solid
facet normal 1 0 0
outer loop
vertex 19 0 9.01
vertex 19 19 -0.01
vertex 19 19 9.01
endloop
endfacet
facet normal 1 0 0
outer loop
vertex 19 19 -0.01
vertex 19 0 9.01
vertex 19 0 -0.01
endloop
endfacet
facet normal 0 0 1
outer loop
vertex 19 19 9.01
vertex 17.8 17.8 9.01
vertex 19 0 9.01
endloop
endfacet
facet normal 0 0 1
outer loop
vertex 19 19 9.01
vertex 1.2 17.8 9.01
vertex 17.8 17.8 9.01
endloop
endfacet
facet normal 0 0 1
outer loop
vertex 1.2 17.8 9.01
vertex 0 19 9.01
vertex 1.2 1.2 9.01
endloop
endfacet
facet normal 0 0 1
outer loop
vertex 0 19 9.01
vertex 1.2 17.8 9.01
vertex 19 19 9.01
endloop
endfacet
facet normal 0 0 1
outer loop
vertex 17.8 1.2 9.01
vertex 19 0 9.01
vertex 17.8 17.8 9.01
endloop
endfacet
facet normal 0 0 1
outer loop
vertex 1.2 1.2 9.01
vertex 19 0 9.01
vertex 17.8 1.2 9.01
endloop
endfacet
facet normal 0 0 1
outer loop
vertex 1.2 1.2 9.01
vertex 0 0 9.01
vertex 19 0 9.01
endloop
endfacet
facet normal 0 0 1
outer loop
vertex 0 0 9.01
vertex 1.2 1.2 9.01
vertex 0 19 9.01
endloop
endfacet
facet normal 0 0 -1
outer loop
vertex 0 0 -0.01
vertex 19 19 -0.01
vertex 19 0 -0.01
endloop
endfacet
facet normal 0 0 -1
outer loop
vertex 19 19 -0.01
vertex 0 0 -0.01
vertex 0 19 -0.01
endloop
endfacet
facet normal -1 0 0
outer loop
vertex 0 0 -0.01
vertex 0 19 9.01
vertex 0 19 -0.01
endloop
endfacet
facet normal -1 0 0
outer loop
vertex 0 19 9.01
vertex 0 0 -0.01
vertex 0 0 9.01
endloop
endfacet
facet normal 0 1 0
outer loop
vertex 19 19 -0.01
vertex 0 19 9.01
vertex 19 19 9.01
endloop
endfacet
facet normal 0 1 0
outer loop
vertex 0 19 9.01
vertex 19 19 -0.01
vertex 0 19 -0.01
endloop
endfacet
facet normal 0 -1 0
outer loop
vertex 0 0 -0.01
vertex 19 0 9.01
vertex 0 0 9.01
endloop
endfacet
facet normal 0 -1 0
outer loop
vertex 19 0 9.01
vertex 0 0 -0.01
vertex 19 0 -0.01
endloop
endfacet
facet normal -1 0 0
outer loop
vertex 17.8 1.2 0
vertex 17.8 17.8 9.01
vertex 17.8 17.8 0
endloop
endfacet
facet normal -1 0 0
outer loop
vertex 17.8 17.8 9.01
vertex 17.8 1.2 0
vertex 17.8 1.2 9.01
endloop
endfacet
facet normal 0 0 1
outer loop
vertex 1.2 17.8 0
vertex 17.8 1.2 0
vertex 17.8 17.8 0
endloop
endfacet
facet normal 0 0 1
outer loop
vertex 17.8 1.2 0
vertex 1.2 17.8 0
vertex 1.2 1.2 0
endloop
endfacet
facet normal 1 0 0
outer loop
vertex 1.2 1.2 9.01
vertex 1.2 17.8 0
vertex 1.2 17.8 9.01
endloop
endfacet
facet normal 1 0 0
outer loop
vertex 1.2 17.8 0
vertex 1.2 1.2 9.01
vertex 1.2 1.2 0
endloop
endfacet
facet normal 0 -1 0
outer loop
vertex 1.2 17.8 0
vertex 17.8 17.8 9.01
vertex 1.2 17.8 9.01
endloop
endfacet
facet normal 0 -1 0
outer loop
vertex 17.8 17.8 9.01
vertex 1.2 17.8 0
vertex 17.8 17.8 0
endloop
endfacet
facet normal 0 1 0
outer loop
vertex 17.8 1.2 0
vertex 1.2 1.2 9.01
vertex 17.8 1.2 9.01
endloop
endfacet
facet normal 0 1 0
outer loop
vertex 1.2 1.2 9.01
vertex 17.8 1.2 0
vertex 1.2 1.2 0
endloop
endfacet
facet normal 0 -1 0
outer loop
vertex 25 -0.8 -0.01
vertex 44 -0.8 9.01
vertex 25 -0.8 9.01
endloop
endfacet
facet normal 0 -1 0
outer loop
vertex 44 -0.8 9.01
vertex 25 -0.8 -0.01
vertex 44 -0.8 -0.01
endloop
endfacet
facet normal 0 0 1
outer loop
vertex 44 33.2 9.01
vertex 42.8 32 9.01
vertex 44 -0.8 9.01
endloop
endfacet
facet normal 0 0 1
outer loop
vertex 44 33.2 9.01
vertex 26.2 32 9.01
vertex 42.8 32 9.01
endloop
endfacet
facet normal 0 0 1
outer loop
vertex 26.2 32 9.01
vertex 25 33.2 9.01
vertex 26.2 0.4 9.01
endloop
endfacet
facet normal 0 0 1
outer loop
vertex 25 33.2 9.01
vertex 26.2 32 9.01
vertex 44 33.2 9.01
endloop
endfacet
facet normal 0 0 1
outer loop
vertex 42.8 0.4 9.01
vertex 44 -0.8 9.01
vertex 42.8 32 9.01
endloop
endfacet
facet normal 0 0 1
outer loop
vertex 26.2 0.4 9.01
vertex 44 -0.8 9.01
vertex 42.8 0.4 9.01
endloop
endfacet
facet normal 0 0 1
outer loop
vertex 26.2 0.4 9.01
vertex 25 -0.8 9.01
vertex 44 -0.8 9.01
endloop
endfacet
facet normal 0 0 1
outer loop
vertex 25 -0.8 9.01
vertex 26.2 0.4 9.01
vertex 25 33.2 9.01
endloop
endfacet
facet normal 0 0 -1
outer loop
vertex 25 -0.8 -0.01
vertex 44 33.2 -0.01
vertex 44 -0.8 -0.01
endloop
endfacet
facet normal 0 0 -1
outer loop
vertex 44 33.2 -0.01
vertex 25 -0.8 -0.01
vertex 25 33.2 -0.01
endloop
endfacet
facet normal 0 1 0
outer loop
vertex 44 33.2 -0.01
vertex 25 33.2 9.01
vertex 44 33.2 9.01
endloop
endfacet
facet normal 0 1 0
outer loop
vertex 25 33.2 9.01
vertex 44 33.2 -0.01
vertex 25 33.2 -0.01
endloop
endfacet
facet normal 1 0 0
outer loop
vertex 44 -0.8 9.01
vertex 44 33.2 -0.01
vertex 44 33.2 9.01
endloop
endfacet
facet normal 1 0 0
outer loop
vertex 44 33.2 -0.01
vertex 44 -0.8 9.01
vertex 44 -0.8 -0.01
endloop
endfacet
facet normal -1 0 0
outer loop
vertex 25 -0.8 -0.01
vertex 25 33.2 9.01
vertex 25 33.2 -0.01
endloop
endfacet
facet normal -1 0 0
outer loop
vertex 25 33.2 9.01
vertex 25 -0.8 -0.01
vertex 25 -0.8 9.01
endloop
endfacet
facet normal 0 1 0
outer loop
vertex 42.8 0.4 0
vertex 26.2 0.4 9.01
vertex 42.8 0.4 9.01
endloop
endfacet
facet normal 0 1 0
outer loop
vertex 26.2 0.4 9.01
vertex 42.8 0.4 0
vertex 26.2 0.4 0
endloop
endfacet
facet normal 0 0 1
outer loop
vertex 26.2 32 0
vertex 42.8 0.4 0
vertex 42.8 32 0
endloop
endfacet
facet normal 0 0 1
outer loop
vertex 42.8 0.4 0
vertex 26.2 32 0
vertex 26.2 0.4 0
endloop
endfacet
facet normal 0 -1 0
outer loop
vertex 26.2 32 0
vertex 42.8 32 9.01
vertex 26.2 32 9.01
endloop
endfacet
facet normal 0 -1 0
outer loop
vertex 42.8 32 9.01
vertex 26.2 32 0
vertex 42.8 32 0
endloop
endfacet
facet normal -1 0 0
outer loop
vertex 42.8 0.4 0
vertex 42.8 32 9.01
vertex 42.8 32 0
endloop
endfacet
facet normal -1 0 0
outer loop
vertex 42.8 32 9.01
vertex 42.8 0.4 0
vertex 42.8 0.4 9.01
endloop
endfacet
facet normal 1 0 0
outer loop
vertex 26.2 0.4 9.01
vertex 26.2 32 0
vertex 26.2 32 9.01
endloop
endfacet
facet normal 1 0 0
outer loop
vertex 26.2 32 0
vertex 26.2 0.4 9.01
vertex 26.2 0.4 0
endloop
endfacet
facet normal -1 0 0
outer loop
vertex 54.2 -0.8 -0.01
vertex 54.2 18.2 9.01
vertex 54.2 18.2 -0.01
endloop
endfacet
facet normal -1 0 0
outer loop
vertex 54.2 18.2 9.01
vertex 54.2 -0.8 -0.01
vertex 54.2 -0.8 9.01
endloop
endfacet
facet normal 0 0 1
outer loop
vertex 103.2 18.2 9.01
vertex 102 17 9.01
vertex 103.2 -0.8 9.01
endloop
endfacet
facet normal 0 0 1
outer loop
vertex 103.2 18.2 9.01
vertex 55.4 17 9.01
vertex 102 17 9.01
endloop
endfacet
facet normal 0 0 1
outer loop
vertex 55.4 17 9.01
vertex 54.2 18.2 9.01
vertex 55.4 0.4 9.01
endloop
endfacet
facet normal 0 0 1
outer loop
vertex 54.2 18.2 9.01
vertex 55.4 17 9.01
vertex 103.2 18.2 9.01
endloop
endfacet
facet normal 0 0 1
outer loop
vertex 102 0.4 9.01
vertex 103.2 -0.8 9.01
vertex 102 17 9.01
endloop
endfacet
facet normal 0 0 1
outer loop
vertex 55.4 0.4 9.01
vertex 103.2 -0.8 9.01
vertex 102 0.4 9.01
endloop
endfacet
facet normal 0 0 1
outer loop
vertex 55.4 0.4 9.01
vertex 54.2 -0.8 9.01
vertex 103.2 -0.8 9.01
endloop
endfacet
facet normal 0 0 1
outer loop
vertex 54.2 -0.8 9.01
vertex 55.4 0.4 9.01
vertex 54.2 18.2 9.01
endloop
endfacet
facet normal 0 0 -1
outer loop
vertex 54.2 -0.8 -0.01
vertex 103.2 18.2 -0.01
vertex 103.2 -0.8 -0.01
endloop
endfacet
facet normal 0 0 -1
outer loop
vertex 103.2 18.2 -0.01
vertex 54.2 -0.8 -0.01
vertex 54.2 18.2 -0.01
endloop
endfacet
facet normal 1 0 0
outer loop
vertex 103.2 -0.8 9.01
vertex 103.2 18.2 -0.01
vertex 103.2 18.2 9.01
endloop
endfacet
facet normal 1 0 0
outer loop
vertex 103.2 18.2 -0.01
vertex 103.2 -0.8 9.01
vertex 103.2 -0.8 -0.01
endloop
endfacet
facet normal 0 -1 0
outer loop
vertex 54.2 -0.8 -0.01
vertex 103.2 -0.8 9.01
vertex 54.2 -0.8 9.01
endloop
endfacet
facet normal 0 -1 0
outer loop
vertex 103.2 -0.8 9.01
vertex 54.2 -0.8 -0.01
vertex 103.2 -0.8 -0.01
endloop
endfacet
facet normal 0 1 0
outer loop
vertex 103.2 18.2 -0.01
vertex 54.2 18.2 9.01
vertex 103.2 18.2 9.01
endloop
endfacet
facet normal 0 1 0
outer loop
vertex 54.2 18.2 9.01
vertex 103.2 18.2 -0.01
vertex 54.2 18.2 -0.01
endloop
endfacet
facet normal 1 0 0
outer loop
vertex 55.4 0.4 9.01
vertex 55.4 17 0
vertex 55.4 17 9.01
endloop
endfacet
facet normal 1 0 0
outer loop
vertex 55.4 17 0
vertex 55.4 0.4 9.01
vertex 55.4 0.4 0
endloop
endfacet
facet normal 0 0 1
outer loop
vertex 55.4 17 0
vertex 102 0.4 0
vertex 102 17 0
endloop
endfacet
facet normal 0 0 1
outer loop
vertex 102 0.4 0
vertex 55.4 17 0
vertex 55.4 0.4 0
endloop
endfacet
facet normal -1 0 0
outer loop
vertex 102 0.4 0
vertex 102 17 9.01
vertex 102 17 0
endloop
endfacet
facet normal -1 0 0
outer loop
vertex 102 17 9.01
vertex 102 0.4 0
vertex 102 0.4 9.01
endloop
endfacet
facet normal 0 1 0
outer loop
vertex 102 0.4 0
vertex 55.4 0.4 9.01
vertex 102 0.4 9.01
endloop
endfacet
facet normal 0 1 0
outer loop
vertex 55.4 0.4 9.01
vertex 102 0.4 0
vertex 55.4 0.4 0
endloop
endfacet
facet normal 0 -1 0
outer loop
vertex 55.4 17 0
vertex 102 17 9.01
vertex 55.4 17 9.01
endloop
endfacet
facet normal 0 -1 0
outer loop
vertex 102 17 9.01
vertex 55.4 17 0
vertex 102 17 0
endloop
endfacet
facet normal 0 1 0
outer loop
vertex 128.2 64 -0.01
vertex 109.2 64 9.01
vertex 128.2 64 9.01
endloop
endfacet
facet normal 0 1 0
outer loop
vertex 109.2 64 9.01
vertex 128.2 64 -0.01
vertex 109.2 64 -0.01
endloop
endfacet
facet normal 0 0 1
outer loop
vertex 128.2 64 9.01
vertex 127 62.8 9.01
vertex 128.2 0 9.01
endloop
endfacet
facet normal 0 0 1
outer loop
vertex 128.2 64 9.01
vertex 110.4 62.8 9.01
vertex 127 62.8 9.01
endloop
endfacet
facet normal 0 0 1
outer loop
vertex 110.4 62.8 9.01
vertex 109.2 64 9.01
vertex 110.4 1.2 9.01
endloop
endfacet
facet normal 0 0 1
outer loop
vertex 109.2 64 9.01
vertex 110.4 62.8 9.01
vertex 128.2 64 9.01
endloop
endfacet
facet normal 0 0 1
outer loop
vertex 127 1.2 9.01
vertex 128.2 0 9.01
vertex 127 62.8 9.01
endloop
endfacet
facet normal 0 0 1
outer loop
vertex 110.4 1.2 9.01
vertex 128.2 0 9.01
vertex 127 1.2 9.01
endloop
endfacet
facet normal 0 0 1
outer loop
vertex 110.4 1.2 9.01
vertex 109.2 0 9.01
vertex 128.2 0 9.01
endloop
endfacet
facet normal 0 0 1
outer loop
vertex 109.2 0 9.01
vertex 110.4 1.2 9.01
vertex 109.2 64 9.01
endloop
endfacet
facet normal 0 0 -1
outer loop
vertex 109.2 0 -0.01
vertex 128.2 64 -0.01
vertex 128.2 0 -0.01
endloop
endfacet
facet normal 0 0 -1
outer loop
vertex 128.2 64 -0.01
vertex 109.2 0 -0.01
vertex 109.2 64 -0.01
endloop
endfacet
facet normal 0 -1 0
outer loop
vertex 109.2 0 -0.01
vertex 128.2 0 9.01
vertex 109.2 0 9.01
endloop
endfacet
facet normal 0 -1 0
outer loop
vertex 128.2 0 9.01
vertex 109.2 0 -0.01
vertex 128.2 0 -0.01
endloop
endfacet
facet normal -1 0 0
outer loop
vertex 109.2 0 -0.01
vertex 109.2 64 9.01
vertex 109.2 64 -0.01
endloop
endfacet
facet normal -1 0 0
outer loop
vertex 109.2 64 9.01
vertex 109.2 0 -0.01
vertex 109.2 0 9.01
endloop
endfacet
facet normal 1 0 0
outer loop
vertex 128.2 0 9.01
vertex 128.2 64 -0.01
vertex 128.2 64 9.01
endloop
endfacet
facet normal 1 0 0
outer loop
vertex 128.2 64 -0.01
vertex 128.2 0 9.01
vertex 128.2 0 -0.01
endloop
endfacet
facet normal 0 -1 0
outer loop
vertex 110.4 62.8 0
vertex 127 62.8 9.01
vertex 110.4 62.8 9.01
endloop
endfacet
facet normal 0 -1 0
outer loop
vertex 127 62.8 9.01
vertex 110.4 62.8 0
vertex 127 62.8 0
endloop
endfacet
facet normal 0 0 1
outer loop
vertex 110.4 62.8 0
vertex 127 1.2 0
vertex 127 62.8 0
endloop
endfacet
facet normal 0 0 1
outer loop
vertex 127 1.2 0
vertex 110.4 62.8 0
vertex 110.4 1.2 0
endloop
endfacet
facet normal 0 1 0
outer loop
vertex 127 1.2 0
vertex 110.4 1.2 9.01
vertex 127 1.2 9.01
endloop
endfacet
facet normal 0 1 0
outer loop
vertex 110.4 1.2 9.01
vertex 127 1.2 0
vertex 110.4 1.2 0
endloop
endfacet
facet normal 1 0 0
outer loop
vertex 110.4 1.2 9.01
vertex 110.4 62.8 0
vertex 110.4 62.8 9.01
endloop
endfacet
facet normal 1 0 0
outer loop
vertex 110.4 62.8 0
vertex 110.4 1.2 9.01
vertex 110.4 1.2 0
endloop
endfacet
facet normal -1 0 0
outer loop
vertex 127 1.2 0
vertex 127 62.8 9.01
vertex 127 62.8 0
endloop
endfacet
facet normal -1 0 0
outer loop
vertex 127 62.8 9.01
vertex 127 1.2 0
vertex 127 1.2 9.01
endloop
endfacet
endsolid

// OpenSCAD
// file: ../../Base/Boxes.scad
// Fischertechnik Box Foundation
// Pre-designed Boxes

use <Constants.scad>

include <PlacementOptions.scad>

box190Width = 190;
box190Depth = 130;
box130Width = 130;
box130Depth = 95;
boxUsageHeight = 33.9;
boxWallThickness = 2.4;
boxBaseThickness = 1.0;

// getBoxWallThickness()
// Gets the wall thickness of a Fischertechnik Box

function getBoxWallThickness() = boxWallThickness;

// Gets the usable height of a fischertechnik box
function getBoxUsageHeight() = boxUsageHeight;

// Gets the thickness of the Fischertechnik box base.
function getBoxBaseThickness() = boxBaseThickness;

// Gets the usable inner space of a Box 190 as an x/y-list
function getBox190Space() = [
    box190Width - 2*getBoxWallThickness(), 
    box190Depth - 2*getBoxWallThickness() ];

// Imports the Fischertechnik empty box 130x190 mm and places it at position 0,0
// 190x130 are the outer sizes, the inner space is slightly smaller. Use getBox190Space() to get the inner sizes.
// This module needs the STL file "Fischertechnik Box 130x190.stl" in the library path.
// The box is positioned that the usable inner space is at the 0,0,0 position. The

module Box190() {
    translate([-getBoxWallThickness(),-getBoxWallThickness(),-getBoxBaseThickness()])
        import("Fischertechnik Box 130x190.stl", convexity=3);
}

// Gets the usable inner space of a Box 130 as an x/y-list
function getBox130Space() = [
    box130Width - 2*getBoxWallThickness(), 
    box130Depth - 2*getBoxWallThickness() ];

// Imports the Fischertechnik empty box 95x130 mm and places it at position 0,0
// 190x130 are the outer sizes, the inner space is slightly smaller. Use getBox190Space() to get the inner sizes.
// This module needs the STL file "Fischertechnik Box 95x130.stl" in the library path.
// The box is positioned that the usable inner space is at the 0,0,0 position. The

module Box130() {
    translate([-getBoxWallThickness(),-getBoxWallThickness(),-getBoxBaseThickness()])
        import("Fischertechnik Box 95x130.stl", convexity=3);
}

// Creates a web at the specified box walls
// corner 0 = LowerLeft, 1 = UpperLeft, 2 = UpperRight, 3 = LowerRight
// side 0 = LeftOfCorner, 1 = RightOfCorner
// distance = Distance in mm from the corner
// box = inner width and depth of the box (default: Box 190)
// webWidth = length of the web (default is 3 mms)
// webThickness = thickness of the web (default is 1 mm)

module BoxWeb(corner, side, distance, box=getBox190Space(), webWidth=3, webThickness=1.0) {
    sink = getBoxWallThickness()/2;

    width = (corner % 2 == 0) ? 
            (side == LeftOfCorner ? webWidth : webThickness) :
            (side == LeftOfCorner ? webThickness : webWidth);

    depth = (corner % 2 == 0) ? 
            (side == RightOfCorner ? webWidth : webThickness) :
            (side == RightOfCorner ? webThickness : webWidth);
    
    xDiff = corner == LowerLeft ? 
                (side == LeftOfCorner ? -sink : distance) :
            (corner == UpperLeft ?                
                (side == LeftOfCorner ? distance : -sink) :
            (corner == UpperRight ?
                (side == LeftOfCorner ? box.x-webWidth+sink : box.x-distance-webThickness) :
                (side == LeftOfCorner ? box.x-distance-webThickness: box.x-webWidth+sink)));

    yDiff = corner == LowerLeft ? 
                (side == RightOfCorner ? -sink : distance) :
            (corner == UpperLeft ?
                (side == RightOfCorner ? box.y-distance : box.y-webWidth+sink) :
            (corner == UpperRight ?
                (side == RightOfCorner ? box.y-webWidth+sink : box.y-distance) :
                (side == RightOfCorner ? distance : -sink)));
    
    translate([xDiff, yDiff, -getExcess()])
        cube([width, depth, boxUsageHeight + 2*getExcess()]);
}
// file: ../../Base/Rotation.scad
// Fischertechnik Box Foundation
// Geometry Helpers Rotation

include <PlacementOptions.scad>

// getRotatedSpace(space, rotation=NoRotation)
// Rotates the space dependent on the specified rotation

function getRotatedSpace(space, rotation=NoRotation) = [
    (rotation == Rotate90 || rotation == Rotate270) ? space.y : space.x,
    (rotation == Rotate90 || rotation == Rotate270) ? space.x : space.y
];

// Rotates the given space around the fixed left lower corner
// space = the space the children needs as width/depth list [width,depth]
// rotation = 0 Rotate0 degrees, 1 Rotate90 degrees, 2 Rotate180 degrees, 3 Rotate270 degrees (equivalent to -90)

module RotateFix(space, rotation=Rotate0) {
    dy = (rotation == Rotate0 || rotation == Rotate270) ? 0 :
        (rotation == Rotate90) ? space.x :
        space.y;
    dx = (rotation < Rotate180) ? 0 :
        (rotation == Rotate180) ? space.x :
        space.y;
    
    translate([dx, dy, 0])
        rotate([0, 0, rotations[rotation]])
            children();
}
// file: ../../Base/Alignment.scad
// Fischertechnik Box Foundation
// Geometry Helpers Alignment

include <PlacementOptions.scad>

// getAlignedX(elementWidth, spaceWidth, align=AlignRight, offset=0)
// Gets the aligned X offset of an element with the given
// width in the given space.
// elementWidth = The width of the element to positon
// spaceWidth = The space where the element should be aligned
// align = 0 AlignLeft, 1 AlignCenter, 2 AlignRight
// offset = an optional offset from the aligned position. When
// aligned left or centered, then positive values are in X direction.
// When aligned right then positive values are in negative X direction.

function getAlignedX(elementWidth, spaceWidth, align=AlignRight, offset=0) =
    (align == AlignLeft) ?
        offset :
        ((align == AlignCenter) ?
        (spaceWidth - elementWidth)/2 + offset :
        spaceWidth - offset - elementWidth);

// getAlignedY(elementDepth, spaceDepth, align=AlignTop, offset=0)
// Gets the aligned Y offset of an element with the given
// depth in the given space.
// elementDepth = The depth of the element to positon
// spaceDepth = The space where the element should be aligned
// align = 0 AlignBottom, 1 AlignCenter, 2 AlignTop
// offset = an optional offset from the aligned position. When
// aligned bottom or centered, then positive values are in Y direction.
// When aligned top then positive values are in negative Y direction.

function getAlignedY(elementDepth, spaceDepth, align=AlignTop, offset=0) =
    (align == AlignBottom) ?
        offset :
        ((align == AlignCenter) ?
        (spaceDepth - elementDepth)/2 + offset :
        spaceDepth - offset - elementDepth);
// file: ../../Base/Constants.scad
// Fischertechnik Box Foundation
// Constants

// Constant values necessary for multiple elements

// Base constants
dividerThickness = 1.2;
excess = 0.01;
fragments = 90;
tolerance = 0.8;

// Gets the thickness of a divider 
function getDividerThickness() = dividerThickness;

// Gets the excess that is used to merge walls into each other
function getExcess() = excess;

// Gets amount of fragments of a cylinder
function getFragments() = fragments;

// Gets the inner tolerance of a frame to each side
function getTolerance() = tolerance;


// Fischertechnik specific constants
axisDiameter = 4;
axisBottomDiameter = axisDiameter + 1;
standardEdgeDistance = 2.5;
standardWebDistance = 11.5;
standardCornerLength = 15;
tubeWallFactor = 1.6;

// Gets axis diameter
function getAxisDiameter() = axisDiameter;

// Gets axis bottom diameter for thicker part at the bottom
function getAxisBottomDiameter() = axisBottomDiameter;

// gets the standard distance to the wall of the box for dockable frames with webs
function getStandardEdgeDistance() = standardEdgeDistance;

// gets the standard distance of each web to the corner of the dockable frame
function getStandardWebDistance() = standardWebDistance;

// gets the standard length of the corner walls of a dockable frame
function getStandardCornerLength() = standardCornerLength;

// gets the wall thickness of a tube.
function getTubeWallThickness() = tubeWallFactor * getDividerThickness();
// file: ../../Base/PlacementOptions.scad
// Fischertechnik Box Foundation
// Placement Options

// Alignment
NoAlign = 0;
AlignLeft = 1;
AlignBottom = 2;
AlignCenter = 3;
AlignRight = 4;
AlignTop = 5;

// Element rotation degree steps
rotations = [0, -90, -180, -270];

// Rotation
NoRotation = 0;
Rotate0 = 0;
Rotate90 = 1;
Rotate180 = 2;
Rotate270 = 3;

// Docking (seen from above)
NoDock = -1;
DockLeft = 0;
DockTop = 1;
DockRight = 2;
DockCorner = 2;
DockBottom = 3;

// Web corners
LowerLeft = 0;
UpperLeft = 1;
UpperRight = 2;
LowerRight = 3;

// Web position relative to corner
LeftOfCorner = 0;
RightOfCorner = 1;
// file: ../../Elements/FrameAngleEquilateral.scad
// Fischertechnik Box Library
// Frame for equilateral angle blocks
// 31010

use <../Base/Constants.scad>
use <../ModelBase/Simple.scad>

width = 15;
depth = 15;
height = 9;

// getFrameAngleEquilateralSpace
// Gets the space the frame angle equilateral needs for count blocks as width and depth (.x and .y as a list)
// count = Count of equilateral angle blocks

function getFrameAngleEquilateralSpace(count=1) = getFrameOuterVolume([width * count, depth, height]);
/*[
    frameGridWidth * count + 2 * getWallThickness() + getTolerance(), 
    frameGridDepth + 2 * getWallThickness() + getFrameInnerGap()];*/

// FrameAngleEquilateral(count)
// count = Count of angle blocks in x direction
// The walls of the frame are 9 mm high.
// The complete frame has a tolerance of addition 1 mm in each direction.

module FrameAngleEquilateral(count=1) {
    innerVolume = getFrameInnerVolume([width * count, depth, height]);
    Frame(innerVolume);
}

// Tests
color ("lightgray")
FrameAngleEquilateral(2);
// file: ../../Base/Deployment.scad
// Fischertechnik Box Foundation
// Geometry Helpers Deployment

use <Constants.scad>
use <Placement.scad>
use <Rotation.scad>

include <PlacementOptions.scad>

// getWidth(spaces, rotations, count, i=0)
// Gets the sum of the width of count specified spaces, including rotations for each space.
// spaces = List of spaces from which the width should be added. Used internally for DeployRow.
// rotations = specify rotations for each space to get its correct width
// count = The count of spaces from the specified spaces that should be included in the sum (for recursive call)
// i = The space index offset used to start to add (for recursive call)

function getWidth(spaces, rotations, count, i=0) = 
    (i < count) ? 
        getRotatedSpace(spaces[i], rotations[i]).x + getWidth(spaces, rotations, count, i+1) : 
        0;

// getX(spaces, rotations, distance, i)
// Calculates the X position of the space with the index i, when the spaces are placed with the given
// equal distances. Used internally for DeployRow.
// spaces = List of spaces from which the width should be added
// rotations = specify rotations for each space to get its correct width
// distance = Equal distance between each space
// i = Index of the space to get its X position for

function getX(spaces, rotations, distance, i) = 
    (i == 0) ? 
        0 :
        (getRotatedSpace(spaces[i-1], rotations[i-1]).x + distance + getX(spaces, rotations, distance, i-1));

// DeployRow(width, spaces, rotations)
// Deploys the elements in the specified width with equal distances.
// rowWidth = The width of the row in mm.
// spaces = The spaces of all elements to deploy.
// rotations = The rotations of each element: 0 Rotate0 0 degrees, 1 Rotate90 90 degrees, 
// 2 Rotate180 180 degrees, 3 Rotate270 270 degrees (equivalent to -90).

module DeployRow(rowWidth, spaces, rotations) {
    distance = (rowWidth - getWidth(spaces, rotations, len(spaces))) / (len(spaces)-1);
    
    for (i = [0:1:$children-1]) {
        x = getX(spaces, rotations, distance, i);
        translate([x, 0])
            RotateFix(spaces[i], rotations[i])
                children(i);
    }
}

// DeploySame(space, elementSpace, columns=2, rows=1, rotation=Rotate0)
// Deploys columns and rows of the specified child in the specified space with
// equal distances
// space = The space where the element copies are deployed
// elementSpace = The space the child needs
// columns = Count of elements per row
// rows = Count of rows deployed
// rotation = The rotation of the child that will be applied

module DeploySame(space, elementSpace, columns=2, rows=1, rotation=Rotate0) {
    
    elementWidth = getRotatedSpace(elementSpace, rotation).x;
    columnDistance = (space.x - columns * elementWidth) / (columns > 1 ? columns - 1 : 1);
    endColumnOffset = space.x - elementWidth;
    columnOffsetStep = elementWidth + columnDistance;
    
    elementDepth = getRotatedSpace(elementSpace, rotation).y;
    rowDistance = (space.y - rows * elementDepth) / (rows > 1 ? rows - 1 : 1);
    endRowOffset = space.y - elementDepth;
    rowOffsetStep = elementDepth + rowDistance;
    
    for (rowOffset = [0:rowOffsetStep:endRowOffset]) {
        for (columnOffset = [0:columnOffsetStep:endColumnOffset]) {
            translate([columnOffset, rowOffset])
                RotateFix(elementSpace, rotation)
                    children(0);
        }
    }
}

// getMergedRowWidth(spaces, rotations, count, i=0)
// Gets the width of the merged spaces with the specified rotations.
// Merging works all elements with two frame walls. 
// The right and left walls are merged into one single wall.
// spaces = List of spaces from which the width should be added.
// rotations = specify rotations for each space to get its correct width
// count = The count of spaces from the specified spaces that should be included in the sum (for recursive call)
// i = The space index offset used to start to add (for recursive call)

function getMergedRowWidth(spaces, rotations, count, i=0) =
    (i < count) ? 
        getRotatedSpace(spaces[i], rotations[i]).x + getWidth(spaces, rotations, count, i+1) - (i > 0 ? getDividerThickness() : 0) : 
        0;

// MergeRow(spaces, rotations, dividerThickness=0.8)
// Deploys the children so that all walls of the neighbors are merged in a single common wall.
// spaces = List of spaces of the children to get the sizes from.
// rotations = specify rotations for each space to get its correct width
// dividerThickness = Thickness of all dividers of the elements (default is 0.8)

module MergeRow(spaces, rotations, dividerThickness = getDividerThickness()) {
    for (i = [0:1:$children-1]) {
        x = getX(spaces, rotations, -getDividerThickness(), i);
        translate([x, 0, 0])
            RotateFix(spaces[i], rotations[i])
                children(i);
    }
}

// Merge(count, space, rotation, dividerThickness=0.8)
// Deploys the child count times so that all walls of the neighbors are merged in a single common wall.
// space = Space of the child to get the sizes from.
// rotation = rotation of the child to get the correct width
// dividerThickness = Thickness of all dividers of the element (default is 0.8)

module Merge(count, space, rotation, dividerThickness = getDividerThickness()) {
    x = getRotatedSpace(space, rotation).x - getDividerThickness();
    for (offset = [0:x:(count-1)*x]) {
        echo(offset);
        translate([offset, 0, 0])
            RotateFix(space, rotation)
                children(0);
    }
}
// file: ../../Base/Placement.scad
// Fischertechnik Box Foundation
// Geometry Helpers Placement

use <Constants.scad>
use <Alignment.scad>
use <Rotation.scad>
use <Boxes.scad>

include <PlacementOptions.scad>

// Place(x=0, y=0, elementSpace=[0,0], alignX=AlignLeft, alignY=AlignBottom, rotation=Rotate0, boxSpace=getBox190Space())
// Places the child at the specified position
// y = Y-Position. This is a relative position when an X aligment is specified.
// x = X-Position. This is a relative position when an Y aligment is specified.
// elementSpace = space of the element to be placed [x,y]
// alignX = -1=NoAlign, 0 AlignLeft, 1 AlignCenter, 3 AlignRight (elementSpace and boxSpace required!)
// alignY = -1=NoAlign, 2 AlignBottom, 1 AlignCenter, 4 AlignTop (elementSpace and boxSpace required!)
// rotation = 0 Rotate0 0 degrees, 1 Rotate90 90 degrees, 
// 2 Rotate180 180 degrees, 3 Rotate270 270 degrees (equivalent to -90)
// boxSpace = Inner space of the box where the placement occurs [x,y] - default is Box 190x130 inner space

module Place(x=0, y=0, elementSpace=[0,0], 
  alignX=AlignLeft, alignY=AlignBottom, 
  rotation=NoRotation, boxSpace=getBox190Space()) {

    module Position(x, y, space, rotation=Rotate0) {
        translate([x, y, 0])
            RotateFix(space, rotation)
                children(0);
    }

    space = getRotatedSpace(elementSpace, rotation);
    alignedX = getAlignedX(space.x, boxSpace.x, alignX, x);
    alignedY = getAlignedY(space.y, boxSpace.y, alignY, y);
    Position(alignedX, alignedY, elementSpace, rotation)
        children(0);
}

// Center(space=getBox130Space(), elementSpace=[0,0])
// space = Space where the children is centered. For cylinder use centered=true and no elementSpace.
// elementSpace = space of the element to be centered [x,y]

module Center(space=getBox190Space(), elementSpace=[0,0]) {
    translate([(space.x - elementSpace.x) / 2, (space.y - elementSpace.y) / 2])
        children(0);
}

// CenterHorizontal(width=0, y=0, offset=0, space=getBox130Space())
// space = Space where the children is centered. For cylinder use centered=true and no elementSpace.
// elementSpace = space of the element to be centered [x,y]

module CenterHorizontal(width=0, y=0, offset=0, space=getBox190Space()) {
    translate([(space.x - width) / 2 + offset, y])
        children(0);
}

// CenterVertical(depth=0, x=0, offset=0, space=getBox130Space())
// space = Space where the children is centered. For cylinder use centered=true and no elementSpace.
// elementSpace = space of the element to be centered [x,y]

module CenterVerticalal(depth=0, x=0, offset=0, space=getBox190Space()) {
    translate([x, (space.y - depth) / 2 + offset])
        children(0);
}
// main file
// Fischertechnik Box Foundation
// Elements
// Test FrameAngleEquilateral

use <../../Base/Placement.scad>
use <../../Base/Deployment.scad>
use <../../Elements/FrameAngleEquilateral.scad>

include <../../Base/PlacementOptions.scad>

FrameAngleEquilateral();

Place(25, 0, elementSpace=getFrameAngleEquilateralSpace(2), rotation=Rotate90)
    FrameAngleEquilateral(2);
    
Place(55, 0, elementSpace=getFrameAngleEquilateralSpace(3), rotation=Rotate180)
    FrameAngleEquilateral(3);
    
Place(110, 0, elementSpace=getFrameAngleEquilateralSpace(4), rotation=Rotate270)
    FrameAngleEquilateral(4);
